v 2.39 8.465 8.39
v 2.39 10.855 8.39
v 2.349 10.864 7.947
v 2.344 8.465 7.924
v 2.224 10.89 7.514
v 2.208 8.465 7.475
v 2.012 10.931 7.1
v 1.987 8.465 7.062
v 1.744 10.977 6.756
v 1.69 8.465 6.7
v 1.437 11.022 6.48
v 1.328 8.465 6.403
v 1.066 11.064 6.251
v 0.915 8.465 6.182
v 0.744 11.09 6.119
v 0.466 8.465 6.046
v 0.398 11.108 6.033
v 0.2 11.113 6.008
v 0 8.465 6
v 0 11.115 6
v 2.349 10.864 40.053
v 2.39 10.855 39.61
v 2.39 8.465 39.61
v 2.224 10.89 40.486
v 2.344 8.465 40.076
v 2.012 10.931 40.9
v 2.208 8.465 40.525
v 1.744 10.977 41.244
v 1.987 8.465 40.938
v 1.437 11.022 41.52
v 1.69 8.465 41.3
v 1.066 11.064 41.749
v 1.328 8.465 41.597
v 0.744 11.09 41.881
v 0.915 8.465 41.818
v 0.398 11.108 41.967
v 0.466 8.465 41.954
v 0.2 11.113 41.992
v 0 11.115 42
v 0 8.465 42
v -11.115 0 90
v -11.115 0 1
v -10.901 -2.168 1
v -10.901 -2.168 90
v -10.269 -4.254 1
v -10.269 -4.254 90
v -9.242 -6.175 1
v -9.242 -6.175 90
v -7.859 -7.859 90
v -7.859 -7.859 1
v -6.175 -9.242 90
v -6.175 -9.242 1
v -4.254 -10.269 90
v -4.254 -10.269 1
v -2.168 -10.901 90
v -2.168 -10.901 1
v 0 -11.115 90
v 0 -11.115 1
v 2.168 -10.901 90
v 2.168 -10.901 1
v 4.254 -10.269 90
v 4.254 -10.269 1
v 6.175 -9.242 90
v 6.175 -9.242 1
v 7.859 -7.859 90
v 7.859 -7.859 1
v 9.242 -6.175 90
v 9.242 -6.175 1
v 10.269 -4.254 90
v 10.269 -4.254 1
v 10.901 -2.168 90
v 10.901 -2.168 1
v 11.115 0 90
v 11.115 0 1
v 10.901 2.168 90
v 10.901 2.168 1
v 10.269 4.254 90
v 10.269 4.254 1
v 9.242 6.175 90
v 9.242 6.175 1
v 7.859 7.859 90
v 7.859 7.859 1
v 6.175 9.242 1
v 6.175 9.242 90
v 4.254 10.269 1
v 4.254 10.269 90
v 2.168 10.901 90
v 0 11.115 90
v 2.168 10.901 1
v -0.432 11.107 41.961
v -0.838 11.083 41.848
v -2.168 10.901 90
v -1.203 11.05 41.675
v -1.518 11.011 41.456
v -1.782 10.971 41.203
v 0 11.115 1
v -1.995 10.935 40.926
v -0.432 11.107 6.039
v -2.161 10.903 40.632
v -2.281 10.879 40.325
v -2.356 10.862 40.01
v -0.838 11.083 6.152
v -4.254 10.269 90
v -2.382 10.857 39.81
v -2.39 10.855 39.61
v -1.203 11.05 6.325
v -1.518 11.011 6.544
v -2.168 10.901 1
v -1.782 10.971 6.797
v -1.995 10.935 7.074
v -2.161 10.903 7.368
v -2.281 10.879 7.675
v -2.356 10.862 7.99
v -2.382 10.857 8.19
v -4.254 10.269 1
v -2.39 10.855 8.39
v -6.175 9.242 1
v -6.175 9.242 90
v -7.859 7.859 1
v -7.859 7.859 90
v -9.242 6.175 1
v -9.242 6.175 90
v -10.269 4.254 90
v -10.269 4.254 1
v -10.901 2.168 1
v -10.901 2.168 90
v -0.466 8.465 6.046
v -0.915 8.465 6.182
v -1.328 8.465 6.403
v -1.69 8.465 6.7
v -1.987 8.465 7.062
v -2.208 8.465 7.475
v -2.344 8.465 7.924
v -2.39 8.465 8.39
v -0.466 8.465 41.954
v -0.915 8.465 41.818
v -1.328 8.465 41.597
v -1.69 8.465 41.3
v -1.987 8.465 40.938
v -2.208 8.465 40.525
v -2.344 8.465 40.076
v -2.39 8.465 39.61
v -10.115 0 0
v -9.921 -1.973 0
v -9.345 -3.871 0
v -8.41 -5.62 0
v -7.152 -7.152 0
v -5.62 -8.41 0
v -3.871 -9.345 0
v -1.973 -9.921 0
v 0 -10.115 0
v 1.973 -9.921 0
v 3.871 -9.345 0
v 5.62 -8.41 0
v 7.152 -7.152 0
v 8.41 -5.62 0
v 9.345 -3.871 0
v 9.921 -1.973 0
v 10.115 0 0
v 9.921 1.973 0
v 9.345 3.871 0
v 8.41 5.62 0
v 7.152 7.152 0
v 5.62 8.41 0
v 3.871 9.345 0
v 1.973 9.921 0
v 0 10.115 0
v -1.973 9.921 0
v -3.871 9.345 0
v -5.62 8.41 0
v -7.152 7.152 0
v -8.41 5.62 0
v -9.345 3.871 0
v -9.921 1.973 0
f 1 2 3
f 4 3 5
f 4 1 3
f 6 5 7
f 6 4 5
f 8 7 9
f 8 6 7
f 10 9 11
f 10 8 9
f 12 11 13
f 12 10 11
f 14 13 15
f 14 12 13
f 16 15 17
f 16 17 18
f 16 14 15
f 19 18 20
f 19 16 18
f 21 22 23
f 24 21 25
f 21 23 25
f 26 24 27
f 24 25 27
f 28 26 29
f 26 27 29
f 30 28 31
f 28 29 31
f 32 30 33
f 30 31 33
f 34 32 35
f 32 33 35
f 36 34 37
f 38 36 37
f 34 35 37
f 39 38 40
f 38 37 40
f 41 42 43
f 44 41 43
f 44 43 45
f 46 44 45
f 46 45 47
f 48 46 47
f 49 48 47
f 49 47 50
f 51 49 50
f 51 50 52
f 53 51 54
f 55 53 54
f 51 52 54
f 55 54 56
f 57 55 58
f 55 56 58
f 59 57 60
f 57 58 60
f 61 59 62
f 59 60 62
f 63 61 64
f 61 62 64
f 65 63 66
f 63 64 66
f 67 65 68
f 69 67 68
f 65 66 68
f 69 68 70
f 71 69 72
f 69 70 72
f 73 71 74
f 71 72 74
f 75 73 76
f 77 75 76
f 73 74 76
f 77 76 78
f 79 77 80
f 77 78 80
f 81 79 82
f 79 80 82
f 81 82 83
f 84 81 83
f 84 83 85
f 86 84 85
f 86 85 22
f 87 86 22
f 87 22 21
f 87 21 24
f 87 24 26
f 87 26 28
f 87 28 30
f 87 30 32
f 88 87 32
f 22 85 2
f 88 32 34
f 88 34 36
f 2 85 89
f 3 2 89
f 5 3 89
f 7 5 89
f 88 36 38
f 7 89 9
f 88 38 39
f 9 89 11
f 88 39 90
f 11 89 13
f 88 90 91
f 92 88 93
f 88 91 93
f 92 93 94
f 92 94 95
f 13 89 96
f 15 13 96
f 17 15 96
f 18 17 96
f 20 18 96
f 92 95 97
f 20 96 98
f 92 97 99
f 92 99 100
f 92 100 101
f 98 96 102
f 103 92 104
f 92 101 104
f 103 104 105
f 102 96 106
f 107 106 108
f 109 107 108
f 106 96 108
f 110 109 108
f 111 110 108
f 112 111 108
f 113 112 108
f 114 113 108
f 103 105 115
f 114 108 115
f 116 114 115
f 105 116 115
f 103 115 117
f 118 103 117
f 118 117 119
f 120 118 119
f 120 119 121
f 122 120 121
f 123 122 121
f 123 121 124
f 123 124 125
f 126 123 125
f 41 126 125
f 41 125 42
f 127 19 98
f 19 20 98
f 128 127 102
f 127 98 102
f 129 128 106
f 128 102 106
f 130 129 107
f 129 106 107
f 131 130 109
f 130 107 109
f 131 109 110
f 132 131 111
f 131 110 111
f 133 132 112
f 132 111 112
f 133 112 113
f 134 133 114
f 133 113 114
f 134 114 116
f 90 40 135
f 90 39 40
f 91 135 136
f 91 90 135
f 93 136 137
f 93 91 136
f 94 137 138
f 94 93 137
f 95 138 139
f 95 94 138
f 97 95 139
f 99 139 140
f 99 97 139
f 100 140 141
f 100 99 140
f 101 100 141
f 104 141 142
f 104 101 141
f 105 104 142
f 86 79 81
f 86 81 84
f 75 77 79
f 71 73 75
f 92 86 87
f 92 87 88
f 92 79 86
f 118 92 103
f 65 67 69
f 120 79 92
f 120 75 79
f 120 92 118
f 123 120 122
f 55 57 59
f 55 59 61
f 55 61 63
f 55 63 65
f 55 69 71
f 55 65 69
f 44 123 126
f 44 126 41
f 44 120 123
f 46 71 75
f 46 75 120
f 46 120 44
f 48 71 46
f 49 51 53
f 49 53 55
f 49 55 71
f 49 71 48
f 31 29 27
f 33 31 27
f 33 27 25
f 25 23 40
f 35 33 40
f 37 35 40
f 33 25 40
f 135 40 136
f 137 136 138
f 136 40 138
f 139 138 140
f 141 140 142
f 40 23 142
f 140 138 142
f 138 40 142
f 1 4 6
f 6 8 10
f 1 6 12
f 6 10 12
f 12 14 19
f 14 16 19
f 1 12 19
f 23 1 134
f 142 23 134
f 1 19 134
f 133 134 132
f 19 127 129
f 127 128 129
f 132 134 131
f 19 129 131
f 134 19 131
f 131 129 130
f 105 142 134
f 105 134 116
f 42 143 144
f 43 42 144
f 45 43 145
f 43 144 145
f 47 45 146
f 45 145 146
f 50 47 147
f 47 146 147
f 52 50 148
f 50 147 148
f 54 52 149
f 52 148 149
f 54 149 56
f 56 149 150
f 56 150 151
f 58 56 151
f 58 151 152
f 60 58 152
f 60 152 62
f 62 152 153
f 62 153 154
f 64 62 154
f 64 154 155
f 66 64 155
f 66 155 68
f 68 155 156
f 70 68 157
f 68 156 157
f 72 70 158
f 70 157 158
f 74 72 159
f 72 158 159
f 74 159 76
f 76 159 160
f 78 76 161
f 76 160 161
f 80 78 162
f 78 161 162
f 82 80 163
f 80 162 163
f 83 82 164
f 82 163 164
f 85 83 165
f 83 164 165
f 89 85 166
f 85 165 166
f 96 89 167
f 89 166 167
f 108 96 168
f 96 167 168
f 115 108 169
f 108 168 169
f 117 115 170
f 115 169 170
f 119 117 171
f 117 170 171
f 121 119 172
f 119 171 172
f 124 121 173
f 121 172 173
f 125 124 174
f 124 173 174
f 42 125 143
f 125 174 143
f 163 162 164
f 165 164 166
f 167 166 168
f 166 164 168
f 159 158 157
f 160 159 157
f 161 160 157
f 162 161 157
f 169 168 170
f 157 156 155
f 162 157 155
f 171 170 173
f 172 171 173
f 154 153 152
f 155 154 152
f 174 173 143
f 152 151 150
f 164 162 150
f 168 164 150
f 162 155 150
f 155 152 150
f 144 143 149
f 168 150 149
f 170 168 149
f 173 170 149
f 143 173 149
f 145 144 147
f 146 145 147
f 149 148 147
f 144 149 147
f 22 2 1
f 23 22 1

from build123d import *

# Parameters (mm, degrees)
SZKIC1_R                    = 11.115
DODANIE_WYCI_GNI_CIE1_DEPTH = 90
SFAZOWANIE1_SIZE            = 1
WYTNIJ_WYCI_GNI_CIE1_DEPTH  = 36
ZAOKR_GLENIE1_R             = 2.39
ZAOKR_GLENIE2_R             = 2.39


with BuildPart() as part:
    # Szkic1 → Dodanie-wyciągnięcie1 (new body)
    with BuildSketch(Plane.XY):
        with Locations(Location((0, 0, 0), (0, 0, 180))):
            Circle(SZKIC1_R)
    extrude(amount=DODANIE_WYCI_GNI_CIE1_DEPTH)

    # Sfazowanie1
    sfazowanie1_edges = [part.edges().sort_by_distance(p)[0] for p in [
        (11.115, 0, 0),
    ]]
    chamfer(sfazowanie1_edges, length=SFAZOWANIE1_SIZE)

    # Szkic2 → Wytnij-wyciągnięcie1 (cut)
    with BuildSketch(Plane(origin=(0, 0, 6), x_dir=(-1, 0, 0), z_dir=(0, 0, -1))):
        with BuildLine():
            Line((-2.39, 10.855004606), (-2.39, 8.465004606))
            Line((-2.39, 8.465004606), (2.39, 8.465004606))
            Line((2.39, 8.465004606), (2.39, 10.855004606))
            ThreePointArc((2.39, 10.855004606), (0, 11.115), (-2.39, 10.855004606))
        make_face()
    extrude(amount=-WYTNIJ_WYCI_GNI_CIE1_DEPTH, mode=Mode.SUBTRACT)

    # Zaokrąglenie1
    zaokr_glenie1_edges = [part.edges().sort_by_distance(p)[0] for p in [
        (-2.39, 9.660004606, 42),
        (2.39, 9.660004606, 42),
    ]]
    fillet(zaokr_glenie1_edges, radius=ZAOKR_GLENIE1_R - 0.0001)  # a hair under: the kernel refuses the full size

    # Zaokrąglenie2
    zaokr_glenie2_edges = [part.edges().sort_by_distance(p)[0] for p in [
        (2.39, 9.660004606, 6),
        (-2.39, 9.660004606, 6),
    ]]
    fillet(zaokr_glenie2_edges, radius=ZAOKR_GLENIE2_R - 0.0001)  # a hair under: the kernel refuses the full size


solid = part.part
